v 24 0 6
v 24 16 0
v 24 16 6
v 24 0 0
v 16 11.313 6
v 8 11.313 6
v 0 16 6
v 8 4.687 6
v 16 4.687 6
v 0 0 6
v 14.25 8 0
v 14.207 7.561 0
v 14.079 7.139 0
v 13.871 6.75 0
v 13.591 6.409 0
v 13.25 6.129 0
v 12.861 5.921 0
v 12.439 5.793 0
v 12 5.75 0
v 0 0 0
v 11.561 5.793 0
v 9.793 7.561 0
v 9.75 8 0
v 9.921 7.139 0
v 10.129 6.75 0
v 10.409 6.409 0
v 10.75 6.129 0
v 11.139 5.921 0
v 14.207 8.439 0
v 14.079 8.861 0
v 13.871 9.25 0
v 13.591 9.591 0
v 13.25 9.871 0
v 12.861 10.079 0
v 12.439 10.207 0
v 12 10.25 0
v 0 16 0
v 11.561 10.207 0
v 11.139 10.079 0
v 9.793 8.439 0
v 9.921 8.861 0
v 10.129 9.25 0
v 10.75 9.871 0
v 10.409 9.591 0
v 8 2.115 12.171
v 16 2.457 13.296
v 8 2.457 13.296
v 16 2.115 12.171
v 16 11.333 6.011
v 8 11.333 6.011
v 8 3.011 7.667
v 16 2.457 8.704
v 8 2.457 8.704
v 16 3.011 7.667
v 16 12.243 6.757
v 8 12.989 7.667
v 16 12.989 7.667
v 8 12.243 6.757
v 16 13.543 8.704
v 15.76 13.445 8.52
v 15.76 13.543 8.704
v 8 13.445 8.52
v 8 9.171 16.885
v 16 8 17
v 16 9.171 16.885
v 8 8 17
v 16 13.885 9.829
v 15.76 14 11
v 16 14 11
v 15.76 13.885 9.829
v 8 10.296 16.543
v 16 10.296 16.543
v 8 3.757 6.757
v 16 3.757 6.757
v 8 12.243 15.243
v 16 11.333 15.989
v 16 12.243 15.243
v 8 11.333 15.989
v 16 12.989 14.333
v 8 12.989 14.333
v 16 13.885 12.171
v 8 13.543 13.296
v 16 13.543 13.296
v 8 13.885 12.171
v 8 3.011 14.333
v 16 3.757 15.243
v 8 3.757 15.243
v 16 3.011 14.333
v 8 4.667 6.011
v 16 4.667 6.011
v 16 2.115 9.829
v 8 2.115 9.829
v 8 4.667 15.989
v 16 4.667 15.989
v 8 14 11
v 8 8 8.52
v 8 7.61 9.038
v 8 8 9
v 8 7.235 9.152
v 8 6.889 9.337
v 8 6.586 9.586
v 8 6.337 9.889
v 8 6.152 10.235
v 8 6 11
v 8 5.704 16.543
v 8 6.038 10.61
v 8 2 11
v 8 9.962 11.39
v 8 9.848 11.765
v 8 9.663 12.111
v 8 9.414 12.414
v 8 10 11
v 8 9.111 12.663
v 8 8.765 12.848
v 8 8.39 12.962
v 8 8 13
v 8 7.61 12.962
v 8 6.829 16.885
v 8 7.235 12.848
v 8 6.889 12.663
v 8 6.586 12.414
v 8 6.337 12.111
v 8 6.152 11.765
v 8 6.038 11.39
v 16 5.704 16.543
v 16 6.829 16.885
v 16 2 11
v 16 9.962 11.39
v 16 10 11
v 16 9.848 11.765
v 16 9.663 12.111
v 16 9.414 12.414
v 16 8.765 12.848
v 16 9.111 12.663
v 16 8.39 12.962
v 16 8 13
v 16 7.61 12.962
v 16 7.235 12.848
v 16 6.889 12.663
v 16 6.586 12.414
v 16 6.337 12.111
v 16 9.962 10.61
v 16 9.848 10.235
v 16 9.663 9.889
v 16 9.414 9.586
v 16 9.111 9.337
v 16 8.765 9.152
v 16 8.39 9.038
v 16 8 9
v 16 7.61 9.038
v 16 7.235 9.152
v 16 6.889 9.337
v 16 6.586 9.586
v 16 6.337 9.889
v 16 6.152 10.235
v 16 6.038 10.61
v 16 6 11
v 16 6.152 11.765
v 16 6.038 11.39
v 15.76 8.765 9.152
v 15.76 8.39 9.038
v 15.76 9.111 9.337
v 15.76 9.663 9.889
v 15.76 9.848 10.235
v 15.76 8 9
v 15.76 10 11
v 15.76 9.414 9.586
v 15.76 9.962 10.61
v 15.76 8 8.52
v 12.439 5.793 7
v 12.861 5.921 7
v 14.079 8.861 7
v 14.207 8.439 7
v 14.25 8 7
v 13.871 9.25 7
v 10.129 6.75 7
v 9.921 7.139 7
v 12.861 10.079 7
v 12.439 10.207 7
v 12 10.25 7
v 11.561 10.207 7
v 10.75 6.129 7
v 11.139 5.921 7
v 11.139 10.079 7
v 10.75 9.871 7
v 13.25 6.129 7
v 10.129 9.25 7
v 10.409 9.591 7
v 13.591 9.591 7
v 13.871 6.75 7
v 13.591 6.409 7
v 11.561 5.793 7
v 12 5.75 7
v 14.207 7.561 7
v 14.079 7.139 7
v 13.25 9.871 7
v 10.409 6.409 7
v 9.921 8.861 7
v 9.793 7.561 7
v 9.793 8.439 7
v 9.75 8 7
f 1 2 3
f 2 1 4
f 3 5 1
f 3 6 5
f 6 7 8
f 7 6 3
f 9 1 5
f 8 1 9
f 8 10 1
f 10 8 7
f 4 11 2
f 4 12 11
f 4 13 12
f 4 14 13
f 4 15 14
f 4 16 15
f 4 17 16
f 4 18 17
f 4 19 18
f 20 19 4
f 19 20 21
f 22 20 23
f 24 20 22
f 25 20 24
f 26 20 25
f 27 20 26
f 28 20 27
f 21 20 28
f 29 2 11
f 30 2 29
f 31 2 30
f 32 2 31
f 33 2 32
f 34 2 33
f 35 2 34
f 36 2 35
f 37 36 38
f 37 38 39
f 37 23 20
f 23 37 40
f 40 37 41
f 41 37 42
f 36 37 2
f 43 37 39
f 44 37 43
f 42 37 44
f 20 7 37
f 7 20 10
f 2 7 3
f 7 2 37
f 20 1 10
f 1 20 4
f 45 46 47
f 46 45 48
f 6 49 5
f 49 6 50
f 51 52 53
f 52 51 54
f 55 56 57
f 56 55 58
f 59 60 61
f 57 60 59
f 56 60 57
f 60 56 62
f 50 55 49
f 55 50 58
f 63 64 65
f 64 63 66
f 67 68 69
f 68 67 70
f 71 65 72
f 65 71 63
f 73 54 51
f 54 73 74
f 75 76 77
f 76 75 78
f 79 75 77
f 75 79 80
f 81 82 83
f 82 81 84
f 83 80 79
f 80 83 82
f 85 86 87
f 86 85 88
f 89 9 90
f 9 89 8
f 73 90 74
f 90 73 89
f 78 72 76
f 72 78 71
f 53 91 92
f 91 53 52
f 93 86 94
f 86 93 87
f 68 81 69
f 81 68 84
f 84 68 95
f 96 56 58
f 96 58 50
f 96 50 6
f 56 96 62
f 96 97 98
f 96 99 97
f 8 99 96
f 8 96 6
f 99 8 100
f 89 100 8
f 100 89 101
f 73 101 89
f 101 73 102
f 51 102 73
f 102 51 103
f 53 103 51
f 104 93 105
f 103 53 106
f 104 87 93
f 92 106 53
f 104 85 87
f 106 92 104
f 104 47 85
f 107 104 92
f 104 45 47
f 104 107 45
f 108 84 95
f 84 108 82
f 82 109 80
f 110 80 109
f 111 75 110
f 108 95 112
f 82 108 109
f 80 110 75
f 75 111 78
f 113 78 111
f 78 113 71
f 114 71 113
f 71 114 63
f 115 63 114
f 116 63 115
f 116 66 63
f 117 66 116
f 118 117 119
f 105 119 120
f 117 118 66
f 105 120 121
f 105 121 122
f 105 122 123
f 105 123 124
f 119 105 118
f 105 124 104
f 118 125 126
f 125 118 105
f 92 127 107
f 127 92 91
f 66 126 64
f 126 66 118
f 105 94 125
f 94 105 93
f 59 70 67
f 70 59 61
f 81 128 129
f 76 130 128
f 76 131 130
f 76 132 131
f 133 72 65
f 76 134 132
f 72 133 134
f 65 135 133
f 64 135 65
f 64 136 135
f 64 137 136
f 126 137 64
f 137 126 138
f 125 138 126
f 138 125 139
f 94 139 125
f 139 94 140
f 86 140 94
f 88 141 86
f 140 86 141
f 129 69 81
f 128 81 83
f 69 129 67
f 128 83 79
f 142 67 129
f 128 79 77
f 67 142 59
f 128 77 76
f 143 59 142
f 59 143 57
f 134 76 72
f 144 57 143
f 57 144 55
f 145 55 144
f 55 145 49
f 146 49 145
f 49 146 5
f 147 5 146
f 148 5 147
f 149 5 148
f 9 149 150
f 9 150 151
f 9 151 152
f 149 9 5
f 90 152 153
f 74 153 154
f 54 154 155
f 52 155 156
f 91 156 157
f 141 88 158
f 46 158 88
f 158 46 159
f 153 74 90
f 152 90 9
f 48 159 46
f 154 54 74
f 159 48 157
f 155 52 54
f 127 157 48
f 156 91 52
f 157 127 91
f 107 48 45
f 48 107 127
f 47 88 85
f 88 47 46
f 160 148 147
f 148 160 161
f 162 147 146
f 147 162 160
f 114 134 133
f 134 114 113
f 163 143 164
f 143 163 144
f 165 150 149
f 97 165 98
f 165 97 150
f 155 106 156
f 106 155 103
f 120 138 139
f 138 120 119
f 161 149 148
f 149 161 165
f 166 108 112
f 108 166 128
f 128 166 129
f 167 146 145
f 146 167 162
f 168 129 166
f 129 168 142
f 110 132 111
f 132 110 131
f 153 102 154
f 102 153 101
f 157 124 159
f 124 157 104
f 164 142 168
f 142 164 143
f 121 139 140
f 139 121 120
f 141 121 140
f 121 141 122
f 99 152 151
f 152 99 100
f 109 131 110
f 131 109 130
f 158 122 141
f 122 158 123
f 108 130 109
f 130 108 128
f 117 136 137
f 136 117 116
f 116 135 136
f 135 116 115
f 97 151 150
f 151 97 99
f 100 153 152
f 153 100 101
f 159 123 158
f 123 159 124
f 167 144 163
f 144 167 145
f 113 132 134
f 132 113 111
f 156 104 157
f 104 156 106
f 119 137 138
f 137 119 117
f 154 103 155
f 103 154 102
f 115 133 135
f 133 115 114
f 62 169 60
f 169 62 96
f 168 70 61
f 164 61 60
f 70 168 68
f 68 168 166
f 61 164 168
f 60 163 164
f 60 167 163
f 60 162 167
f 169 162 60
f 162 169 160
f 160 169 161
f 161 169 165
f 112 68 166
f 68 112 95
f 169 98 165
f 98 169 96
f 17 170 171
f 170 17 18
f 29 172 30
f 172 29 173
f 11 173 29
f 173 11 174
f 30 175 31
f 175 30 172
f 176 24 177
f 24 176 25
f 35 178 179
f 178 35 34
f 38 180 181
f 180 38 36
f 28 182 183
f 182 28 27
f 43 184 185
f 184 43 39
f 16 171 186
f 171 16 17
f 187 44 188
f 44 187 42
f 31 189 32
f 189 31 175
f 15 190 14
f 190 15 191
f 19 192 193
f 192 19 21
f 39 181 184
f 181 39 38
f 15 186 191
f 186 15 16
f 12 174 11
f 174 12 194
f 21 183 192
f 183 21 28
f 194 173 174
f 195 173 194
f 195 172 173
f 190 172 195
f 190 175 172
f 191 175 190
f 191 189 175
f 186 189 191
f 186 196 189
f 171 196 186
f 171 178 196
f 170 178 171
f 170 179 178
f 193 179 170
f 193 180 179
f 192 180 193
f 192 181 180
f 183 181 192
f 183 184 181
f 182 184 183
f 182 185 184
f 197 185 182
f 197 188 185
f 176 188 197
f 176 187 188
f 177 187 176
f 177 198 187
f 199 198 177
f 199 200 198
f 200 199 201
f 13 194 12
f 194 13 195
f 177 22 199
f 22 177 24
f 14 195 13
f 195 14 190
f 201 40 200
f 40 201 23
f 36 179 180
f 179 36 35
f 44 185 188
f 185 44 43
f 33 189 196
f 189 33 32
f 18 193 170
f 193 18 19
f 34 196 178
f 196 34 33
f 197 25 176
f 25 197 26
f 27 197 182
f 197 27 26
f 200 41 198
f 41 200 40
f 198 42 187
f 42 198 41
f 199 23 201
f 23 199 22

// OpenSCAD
$fn = 32;

// ----------------------------------------------------------------------
// Cable clip: cable 4 mm, clamp 12 mm, base 24 mm
// ----------------------------------------------------------------------

// --- parameters (mm) ---
base_w = 24;              // base length, X
base_d = 16;              // base width, Y
base_t = 6;               // base thickness
clamp_d = 12;             // clamp outside diameter
wall_t = 4;               // clamp wall
cable_d = 4;              // cable opening
ring_w = 8;               // clamp width along the cable
screw_d = 4.5;            // screw clearance
throat = 2.48;            // snap throat width
sink = 1;                 // overlap of the clamp into the base

module base() {
  cube([base_w, base_d, base_t]);
}

module clamp() {
  translate([base_w / 2, base_d / 2, base_t + clamp_d / 2 - sink]) rotate([0, 90, 0])
    cylinder(h = ring_w, d = clamp_d, center = true);
}

difference() {
  union() {
    base();
    clamp();
  }
  translate([base_w / 2, base_d / 2, base_t + clamp_d / 2 - sink]) rotate([0, 90, 0]) translate([0, 0, -ring_w / 2 - 1]) cylinder(h = ring_w + 2, d = cable_d);
  /* snap throat: the opening is narrower than the cable */
  translate([base_w / 2 - throat / 2, base_d / 2, base_t + clamp_d / 2 - sink]) rotate([0, 90, 0]) translate([0, 0, -ring_w / 2 - 1]) cube([throat, clamp_d + 2, ring_w + 2]);
  translate([12, base_d / 2, -1]) cylinder(h = base_t + 2, d = screw_d);
}
